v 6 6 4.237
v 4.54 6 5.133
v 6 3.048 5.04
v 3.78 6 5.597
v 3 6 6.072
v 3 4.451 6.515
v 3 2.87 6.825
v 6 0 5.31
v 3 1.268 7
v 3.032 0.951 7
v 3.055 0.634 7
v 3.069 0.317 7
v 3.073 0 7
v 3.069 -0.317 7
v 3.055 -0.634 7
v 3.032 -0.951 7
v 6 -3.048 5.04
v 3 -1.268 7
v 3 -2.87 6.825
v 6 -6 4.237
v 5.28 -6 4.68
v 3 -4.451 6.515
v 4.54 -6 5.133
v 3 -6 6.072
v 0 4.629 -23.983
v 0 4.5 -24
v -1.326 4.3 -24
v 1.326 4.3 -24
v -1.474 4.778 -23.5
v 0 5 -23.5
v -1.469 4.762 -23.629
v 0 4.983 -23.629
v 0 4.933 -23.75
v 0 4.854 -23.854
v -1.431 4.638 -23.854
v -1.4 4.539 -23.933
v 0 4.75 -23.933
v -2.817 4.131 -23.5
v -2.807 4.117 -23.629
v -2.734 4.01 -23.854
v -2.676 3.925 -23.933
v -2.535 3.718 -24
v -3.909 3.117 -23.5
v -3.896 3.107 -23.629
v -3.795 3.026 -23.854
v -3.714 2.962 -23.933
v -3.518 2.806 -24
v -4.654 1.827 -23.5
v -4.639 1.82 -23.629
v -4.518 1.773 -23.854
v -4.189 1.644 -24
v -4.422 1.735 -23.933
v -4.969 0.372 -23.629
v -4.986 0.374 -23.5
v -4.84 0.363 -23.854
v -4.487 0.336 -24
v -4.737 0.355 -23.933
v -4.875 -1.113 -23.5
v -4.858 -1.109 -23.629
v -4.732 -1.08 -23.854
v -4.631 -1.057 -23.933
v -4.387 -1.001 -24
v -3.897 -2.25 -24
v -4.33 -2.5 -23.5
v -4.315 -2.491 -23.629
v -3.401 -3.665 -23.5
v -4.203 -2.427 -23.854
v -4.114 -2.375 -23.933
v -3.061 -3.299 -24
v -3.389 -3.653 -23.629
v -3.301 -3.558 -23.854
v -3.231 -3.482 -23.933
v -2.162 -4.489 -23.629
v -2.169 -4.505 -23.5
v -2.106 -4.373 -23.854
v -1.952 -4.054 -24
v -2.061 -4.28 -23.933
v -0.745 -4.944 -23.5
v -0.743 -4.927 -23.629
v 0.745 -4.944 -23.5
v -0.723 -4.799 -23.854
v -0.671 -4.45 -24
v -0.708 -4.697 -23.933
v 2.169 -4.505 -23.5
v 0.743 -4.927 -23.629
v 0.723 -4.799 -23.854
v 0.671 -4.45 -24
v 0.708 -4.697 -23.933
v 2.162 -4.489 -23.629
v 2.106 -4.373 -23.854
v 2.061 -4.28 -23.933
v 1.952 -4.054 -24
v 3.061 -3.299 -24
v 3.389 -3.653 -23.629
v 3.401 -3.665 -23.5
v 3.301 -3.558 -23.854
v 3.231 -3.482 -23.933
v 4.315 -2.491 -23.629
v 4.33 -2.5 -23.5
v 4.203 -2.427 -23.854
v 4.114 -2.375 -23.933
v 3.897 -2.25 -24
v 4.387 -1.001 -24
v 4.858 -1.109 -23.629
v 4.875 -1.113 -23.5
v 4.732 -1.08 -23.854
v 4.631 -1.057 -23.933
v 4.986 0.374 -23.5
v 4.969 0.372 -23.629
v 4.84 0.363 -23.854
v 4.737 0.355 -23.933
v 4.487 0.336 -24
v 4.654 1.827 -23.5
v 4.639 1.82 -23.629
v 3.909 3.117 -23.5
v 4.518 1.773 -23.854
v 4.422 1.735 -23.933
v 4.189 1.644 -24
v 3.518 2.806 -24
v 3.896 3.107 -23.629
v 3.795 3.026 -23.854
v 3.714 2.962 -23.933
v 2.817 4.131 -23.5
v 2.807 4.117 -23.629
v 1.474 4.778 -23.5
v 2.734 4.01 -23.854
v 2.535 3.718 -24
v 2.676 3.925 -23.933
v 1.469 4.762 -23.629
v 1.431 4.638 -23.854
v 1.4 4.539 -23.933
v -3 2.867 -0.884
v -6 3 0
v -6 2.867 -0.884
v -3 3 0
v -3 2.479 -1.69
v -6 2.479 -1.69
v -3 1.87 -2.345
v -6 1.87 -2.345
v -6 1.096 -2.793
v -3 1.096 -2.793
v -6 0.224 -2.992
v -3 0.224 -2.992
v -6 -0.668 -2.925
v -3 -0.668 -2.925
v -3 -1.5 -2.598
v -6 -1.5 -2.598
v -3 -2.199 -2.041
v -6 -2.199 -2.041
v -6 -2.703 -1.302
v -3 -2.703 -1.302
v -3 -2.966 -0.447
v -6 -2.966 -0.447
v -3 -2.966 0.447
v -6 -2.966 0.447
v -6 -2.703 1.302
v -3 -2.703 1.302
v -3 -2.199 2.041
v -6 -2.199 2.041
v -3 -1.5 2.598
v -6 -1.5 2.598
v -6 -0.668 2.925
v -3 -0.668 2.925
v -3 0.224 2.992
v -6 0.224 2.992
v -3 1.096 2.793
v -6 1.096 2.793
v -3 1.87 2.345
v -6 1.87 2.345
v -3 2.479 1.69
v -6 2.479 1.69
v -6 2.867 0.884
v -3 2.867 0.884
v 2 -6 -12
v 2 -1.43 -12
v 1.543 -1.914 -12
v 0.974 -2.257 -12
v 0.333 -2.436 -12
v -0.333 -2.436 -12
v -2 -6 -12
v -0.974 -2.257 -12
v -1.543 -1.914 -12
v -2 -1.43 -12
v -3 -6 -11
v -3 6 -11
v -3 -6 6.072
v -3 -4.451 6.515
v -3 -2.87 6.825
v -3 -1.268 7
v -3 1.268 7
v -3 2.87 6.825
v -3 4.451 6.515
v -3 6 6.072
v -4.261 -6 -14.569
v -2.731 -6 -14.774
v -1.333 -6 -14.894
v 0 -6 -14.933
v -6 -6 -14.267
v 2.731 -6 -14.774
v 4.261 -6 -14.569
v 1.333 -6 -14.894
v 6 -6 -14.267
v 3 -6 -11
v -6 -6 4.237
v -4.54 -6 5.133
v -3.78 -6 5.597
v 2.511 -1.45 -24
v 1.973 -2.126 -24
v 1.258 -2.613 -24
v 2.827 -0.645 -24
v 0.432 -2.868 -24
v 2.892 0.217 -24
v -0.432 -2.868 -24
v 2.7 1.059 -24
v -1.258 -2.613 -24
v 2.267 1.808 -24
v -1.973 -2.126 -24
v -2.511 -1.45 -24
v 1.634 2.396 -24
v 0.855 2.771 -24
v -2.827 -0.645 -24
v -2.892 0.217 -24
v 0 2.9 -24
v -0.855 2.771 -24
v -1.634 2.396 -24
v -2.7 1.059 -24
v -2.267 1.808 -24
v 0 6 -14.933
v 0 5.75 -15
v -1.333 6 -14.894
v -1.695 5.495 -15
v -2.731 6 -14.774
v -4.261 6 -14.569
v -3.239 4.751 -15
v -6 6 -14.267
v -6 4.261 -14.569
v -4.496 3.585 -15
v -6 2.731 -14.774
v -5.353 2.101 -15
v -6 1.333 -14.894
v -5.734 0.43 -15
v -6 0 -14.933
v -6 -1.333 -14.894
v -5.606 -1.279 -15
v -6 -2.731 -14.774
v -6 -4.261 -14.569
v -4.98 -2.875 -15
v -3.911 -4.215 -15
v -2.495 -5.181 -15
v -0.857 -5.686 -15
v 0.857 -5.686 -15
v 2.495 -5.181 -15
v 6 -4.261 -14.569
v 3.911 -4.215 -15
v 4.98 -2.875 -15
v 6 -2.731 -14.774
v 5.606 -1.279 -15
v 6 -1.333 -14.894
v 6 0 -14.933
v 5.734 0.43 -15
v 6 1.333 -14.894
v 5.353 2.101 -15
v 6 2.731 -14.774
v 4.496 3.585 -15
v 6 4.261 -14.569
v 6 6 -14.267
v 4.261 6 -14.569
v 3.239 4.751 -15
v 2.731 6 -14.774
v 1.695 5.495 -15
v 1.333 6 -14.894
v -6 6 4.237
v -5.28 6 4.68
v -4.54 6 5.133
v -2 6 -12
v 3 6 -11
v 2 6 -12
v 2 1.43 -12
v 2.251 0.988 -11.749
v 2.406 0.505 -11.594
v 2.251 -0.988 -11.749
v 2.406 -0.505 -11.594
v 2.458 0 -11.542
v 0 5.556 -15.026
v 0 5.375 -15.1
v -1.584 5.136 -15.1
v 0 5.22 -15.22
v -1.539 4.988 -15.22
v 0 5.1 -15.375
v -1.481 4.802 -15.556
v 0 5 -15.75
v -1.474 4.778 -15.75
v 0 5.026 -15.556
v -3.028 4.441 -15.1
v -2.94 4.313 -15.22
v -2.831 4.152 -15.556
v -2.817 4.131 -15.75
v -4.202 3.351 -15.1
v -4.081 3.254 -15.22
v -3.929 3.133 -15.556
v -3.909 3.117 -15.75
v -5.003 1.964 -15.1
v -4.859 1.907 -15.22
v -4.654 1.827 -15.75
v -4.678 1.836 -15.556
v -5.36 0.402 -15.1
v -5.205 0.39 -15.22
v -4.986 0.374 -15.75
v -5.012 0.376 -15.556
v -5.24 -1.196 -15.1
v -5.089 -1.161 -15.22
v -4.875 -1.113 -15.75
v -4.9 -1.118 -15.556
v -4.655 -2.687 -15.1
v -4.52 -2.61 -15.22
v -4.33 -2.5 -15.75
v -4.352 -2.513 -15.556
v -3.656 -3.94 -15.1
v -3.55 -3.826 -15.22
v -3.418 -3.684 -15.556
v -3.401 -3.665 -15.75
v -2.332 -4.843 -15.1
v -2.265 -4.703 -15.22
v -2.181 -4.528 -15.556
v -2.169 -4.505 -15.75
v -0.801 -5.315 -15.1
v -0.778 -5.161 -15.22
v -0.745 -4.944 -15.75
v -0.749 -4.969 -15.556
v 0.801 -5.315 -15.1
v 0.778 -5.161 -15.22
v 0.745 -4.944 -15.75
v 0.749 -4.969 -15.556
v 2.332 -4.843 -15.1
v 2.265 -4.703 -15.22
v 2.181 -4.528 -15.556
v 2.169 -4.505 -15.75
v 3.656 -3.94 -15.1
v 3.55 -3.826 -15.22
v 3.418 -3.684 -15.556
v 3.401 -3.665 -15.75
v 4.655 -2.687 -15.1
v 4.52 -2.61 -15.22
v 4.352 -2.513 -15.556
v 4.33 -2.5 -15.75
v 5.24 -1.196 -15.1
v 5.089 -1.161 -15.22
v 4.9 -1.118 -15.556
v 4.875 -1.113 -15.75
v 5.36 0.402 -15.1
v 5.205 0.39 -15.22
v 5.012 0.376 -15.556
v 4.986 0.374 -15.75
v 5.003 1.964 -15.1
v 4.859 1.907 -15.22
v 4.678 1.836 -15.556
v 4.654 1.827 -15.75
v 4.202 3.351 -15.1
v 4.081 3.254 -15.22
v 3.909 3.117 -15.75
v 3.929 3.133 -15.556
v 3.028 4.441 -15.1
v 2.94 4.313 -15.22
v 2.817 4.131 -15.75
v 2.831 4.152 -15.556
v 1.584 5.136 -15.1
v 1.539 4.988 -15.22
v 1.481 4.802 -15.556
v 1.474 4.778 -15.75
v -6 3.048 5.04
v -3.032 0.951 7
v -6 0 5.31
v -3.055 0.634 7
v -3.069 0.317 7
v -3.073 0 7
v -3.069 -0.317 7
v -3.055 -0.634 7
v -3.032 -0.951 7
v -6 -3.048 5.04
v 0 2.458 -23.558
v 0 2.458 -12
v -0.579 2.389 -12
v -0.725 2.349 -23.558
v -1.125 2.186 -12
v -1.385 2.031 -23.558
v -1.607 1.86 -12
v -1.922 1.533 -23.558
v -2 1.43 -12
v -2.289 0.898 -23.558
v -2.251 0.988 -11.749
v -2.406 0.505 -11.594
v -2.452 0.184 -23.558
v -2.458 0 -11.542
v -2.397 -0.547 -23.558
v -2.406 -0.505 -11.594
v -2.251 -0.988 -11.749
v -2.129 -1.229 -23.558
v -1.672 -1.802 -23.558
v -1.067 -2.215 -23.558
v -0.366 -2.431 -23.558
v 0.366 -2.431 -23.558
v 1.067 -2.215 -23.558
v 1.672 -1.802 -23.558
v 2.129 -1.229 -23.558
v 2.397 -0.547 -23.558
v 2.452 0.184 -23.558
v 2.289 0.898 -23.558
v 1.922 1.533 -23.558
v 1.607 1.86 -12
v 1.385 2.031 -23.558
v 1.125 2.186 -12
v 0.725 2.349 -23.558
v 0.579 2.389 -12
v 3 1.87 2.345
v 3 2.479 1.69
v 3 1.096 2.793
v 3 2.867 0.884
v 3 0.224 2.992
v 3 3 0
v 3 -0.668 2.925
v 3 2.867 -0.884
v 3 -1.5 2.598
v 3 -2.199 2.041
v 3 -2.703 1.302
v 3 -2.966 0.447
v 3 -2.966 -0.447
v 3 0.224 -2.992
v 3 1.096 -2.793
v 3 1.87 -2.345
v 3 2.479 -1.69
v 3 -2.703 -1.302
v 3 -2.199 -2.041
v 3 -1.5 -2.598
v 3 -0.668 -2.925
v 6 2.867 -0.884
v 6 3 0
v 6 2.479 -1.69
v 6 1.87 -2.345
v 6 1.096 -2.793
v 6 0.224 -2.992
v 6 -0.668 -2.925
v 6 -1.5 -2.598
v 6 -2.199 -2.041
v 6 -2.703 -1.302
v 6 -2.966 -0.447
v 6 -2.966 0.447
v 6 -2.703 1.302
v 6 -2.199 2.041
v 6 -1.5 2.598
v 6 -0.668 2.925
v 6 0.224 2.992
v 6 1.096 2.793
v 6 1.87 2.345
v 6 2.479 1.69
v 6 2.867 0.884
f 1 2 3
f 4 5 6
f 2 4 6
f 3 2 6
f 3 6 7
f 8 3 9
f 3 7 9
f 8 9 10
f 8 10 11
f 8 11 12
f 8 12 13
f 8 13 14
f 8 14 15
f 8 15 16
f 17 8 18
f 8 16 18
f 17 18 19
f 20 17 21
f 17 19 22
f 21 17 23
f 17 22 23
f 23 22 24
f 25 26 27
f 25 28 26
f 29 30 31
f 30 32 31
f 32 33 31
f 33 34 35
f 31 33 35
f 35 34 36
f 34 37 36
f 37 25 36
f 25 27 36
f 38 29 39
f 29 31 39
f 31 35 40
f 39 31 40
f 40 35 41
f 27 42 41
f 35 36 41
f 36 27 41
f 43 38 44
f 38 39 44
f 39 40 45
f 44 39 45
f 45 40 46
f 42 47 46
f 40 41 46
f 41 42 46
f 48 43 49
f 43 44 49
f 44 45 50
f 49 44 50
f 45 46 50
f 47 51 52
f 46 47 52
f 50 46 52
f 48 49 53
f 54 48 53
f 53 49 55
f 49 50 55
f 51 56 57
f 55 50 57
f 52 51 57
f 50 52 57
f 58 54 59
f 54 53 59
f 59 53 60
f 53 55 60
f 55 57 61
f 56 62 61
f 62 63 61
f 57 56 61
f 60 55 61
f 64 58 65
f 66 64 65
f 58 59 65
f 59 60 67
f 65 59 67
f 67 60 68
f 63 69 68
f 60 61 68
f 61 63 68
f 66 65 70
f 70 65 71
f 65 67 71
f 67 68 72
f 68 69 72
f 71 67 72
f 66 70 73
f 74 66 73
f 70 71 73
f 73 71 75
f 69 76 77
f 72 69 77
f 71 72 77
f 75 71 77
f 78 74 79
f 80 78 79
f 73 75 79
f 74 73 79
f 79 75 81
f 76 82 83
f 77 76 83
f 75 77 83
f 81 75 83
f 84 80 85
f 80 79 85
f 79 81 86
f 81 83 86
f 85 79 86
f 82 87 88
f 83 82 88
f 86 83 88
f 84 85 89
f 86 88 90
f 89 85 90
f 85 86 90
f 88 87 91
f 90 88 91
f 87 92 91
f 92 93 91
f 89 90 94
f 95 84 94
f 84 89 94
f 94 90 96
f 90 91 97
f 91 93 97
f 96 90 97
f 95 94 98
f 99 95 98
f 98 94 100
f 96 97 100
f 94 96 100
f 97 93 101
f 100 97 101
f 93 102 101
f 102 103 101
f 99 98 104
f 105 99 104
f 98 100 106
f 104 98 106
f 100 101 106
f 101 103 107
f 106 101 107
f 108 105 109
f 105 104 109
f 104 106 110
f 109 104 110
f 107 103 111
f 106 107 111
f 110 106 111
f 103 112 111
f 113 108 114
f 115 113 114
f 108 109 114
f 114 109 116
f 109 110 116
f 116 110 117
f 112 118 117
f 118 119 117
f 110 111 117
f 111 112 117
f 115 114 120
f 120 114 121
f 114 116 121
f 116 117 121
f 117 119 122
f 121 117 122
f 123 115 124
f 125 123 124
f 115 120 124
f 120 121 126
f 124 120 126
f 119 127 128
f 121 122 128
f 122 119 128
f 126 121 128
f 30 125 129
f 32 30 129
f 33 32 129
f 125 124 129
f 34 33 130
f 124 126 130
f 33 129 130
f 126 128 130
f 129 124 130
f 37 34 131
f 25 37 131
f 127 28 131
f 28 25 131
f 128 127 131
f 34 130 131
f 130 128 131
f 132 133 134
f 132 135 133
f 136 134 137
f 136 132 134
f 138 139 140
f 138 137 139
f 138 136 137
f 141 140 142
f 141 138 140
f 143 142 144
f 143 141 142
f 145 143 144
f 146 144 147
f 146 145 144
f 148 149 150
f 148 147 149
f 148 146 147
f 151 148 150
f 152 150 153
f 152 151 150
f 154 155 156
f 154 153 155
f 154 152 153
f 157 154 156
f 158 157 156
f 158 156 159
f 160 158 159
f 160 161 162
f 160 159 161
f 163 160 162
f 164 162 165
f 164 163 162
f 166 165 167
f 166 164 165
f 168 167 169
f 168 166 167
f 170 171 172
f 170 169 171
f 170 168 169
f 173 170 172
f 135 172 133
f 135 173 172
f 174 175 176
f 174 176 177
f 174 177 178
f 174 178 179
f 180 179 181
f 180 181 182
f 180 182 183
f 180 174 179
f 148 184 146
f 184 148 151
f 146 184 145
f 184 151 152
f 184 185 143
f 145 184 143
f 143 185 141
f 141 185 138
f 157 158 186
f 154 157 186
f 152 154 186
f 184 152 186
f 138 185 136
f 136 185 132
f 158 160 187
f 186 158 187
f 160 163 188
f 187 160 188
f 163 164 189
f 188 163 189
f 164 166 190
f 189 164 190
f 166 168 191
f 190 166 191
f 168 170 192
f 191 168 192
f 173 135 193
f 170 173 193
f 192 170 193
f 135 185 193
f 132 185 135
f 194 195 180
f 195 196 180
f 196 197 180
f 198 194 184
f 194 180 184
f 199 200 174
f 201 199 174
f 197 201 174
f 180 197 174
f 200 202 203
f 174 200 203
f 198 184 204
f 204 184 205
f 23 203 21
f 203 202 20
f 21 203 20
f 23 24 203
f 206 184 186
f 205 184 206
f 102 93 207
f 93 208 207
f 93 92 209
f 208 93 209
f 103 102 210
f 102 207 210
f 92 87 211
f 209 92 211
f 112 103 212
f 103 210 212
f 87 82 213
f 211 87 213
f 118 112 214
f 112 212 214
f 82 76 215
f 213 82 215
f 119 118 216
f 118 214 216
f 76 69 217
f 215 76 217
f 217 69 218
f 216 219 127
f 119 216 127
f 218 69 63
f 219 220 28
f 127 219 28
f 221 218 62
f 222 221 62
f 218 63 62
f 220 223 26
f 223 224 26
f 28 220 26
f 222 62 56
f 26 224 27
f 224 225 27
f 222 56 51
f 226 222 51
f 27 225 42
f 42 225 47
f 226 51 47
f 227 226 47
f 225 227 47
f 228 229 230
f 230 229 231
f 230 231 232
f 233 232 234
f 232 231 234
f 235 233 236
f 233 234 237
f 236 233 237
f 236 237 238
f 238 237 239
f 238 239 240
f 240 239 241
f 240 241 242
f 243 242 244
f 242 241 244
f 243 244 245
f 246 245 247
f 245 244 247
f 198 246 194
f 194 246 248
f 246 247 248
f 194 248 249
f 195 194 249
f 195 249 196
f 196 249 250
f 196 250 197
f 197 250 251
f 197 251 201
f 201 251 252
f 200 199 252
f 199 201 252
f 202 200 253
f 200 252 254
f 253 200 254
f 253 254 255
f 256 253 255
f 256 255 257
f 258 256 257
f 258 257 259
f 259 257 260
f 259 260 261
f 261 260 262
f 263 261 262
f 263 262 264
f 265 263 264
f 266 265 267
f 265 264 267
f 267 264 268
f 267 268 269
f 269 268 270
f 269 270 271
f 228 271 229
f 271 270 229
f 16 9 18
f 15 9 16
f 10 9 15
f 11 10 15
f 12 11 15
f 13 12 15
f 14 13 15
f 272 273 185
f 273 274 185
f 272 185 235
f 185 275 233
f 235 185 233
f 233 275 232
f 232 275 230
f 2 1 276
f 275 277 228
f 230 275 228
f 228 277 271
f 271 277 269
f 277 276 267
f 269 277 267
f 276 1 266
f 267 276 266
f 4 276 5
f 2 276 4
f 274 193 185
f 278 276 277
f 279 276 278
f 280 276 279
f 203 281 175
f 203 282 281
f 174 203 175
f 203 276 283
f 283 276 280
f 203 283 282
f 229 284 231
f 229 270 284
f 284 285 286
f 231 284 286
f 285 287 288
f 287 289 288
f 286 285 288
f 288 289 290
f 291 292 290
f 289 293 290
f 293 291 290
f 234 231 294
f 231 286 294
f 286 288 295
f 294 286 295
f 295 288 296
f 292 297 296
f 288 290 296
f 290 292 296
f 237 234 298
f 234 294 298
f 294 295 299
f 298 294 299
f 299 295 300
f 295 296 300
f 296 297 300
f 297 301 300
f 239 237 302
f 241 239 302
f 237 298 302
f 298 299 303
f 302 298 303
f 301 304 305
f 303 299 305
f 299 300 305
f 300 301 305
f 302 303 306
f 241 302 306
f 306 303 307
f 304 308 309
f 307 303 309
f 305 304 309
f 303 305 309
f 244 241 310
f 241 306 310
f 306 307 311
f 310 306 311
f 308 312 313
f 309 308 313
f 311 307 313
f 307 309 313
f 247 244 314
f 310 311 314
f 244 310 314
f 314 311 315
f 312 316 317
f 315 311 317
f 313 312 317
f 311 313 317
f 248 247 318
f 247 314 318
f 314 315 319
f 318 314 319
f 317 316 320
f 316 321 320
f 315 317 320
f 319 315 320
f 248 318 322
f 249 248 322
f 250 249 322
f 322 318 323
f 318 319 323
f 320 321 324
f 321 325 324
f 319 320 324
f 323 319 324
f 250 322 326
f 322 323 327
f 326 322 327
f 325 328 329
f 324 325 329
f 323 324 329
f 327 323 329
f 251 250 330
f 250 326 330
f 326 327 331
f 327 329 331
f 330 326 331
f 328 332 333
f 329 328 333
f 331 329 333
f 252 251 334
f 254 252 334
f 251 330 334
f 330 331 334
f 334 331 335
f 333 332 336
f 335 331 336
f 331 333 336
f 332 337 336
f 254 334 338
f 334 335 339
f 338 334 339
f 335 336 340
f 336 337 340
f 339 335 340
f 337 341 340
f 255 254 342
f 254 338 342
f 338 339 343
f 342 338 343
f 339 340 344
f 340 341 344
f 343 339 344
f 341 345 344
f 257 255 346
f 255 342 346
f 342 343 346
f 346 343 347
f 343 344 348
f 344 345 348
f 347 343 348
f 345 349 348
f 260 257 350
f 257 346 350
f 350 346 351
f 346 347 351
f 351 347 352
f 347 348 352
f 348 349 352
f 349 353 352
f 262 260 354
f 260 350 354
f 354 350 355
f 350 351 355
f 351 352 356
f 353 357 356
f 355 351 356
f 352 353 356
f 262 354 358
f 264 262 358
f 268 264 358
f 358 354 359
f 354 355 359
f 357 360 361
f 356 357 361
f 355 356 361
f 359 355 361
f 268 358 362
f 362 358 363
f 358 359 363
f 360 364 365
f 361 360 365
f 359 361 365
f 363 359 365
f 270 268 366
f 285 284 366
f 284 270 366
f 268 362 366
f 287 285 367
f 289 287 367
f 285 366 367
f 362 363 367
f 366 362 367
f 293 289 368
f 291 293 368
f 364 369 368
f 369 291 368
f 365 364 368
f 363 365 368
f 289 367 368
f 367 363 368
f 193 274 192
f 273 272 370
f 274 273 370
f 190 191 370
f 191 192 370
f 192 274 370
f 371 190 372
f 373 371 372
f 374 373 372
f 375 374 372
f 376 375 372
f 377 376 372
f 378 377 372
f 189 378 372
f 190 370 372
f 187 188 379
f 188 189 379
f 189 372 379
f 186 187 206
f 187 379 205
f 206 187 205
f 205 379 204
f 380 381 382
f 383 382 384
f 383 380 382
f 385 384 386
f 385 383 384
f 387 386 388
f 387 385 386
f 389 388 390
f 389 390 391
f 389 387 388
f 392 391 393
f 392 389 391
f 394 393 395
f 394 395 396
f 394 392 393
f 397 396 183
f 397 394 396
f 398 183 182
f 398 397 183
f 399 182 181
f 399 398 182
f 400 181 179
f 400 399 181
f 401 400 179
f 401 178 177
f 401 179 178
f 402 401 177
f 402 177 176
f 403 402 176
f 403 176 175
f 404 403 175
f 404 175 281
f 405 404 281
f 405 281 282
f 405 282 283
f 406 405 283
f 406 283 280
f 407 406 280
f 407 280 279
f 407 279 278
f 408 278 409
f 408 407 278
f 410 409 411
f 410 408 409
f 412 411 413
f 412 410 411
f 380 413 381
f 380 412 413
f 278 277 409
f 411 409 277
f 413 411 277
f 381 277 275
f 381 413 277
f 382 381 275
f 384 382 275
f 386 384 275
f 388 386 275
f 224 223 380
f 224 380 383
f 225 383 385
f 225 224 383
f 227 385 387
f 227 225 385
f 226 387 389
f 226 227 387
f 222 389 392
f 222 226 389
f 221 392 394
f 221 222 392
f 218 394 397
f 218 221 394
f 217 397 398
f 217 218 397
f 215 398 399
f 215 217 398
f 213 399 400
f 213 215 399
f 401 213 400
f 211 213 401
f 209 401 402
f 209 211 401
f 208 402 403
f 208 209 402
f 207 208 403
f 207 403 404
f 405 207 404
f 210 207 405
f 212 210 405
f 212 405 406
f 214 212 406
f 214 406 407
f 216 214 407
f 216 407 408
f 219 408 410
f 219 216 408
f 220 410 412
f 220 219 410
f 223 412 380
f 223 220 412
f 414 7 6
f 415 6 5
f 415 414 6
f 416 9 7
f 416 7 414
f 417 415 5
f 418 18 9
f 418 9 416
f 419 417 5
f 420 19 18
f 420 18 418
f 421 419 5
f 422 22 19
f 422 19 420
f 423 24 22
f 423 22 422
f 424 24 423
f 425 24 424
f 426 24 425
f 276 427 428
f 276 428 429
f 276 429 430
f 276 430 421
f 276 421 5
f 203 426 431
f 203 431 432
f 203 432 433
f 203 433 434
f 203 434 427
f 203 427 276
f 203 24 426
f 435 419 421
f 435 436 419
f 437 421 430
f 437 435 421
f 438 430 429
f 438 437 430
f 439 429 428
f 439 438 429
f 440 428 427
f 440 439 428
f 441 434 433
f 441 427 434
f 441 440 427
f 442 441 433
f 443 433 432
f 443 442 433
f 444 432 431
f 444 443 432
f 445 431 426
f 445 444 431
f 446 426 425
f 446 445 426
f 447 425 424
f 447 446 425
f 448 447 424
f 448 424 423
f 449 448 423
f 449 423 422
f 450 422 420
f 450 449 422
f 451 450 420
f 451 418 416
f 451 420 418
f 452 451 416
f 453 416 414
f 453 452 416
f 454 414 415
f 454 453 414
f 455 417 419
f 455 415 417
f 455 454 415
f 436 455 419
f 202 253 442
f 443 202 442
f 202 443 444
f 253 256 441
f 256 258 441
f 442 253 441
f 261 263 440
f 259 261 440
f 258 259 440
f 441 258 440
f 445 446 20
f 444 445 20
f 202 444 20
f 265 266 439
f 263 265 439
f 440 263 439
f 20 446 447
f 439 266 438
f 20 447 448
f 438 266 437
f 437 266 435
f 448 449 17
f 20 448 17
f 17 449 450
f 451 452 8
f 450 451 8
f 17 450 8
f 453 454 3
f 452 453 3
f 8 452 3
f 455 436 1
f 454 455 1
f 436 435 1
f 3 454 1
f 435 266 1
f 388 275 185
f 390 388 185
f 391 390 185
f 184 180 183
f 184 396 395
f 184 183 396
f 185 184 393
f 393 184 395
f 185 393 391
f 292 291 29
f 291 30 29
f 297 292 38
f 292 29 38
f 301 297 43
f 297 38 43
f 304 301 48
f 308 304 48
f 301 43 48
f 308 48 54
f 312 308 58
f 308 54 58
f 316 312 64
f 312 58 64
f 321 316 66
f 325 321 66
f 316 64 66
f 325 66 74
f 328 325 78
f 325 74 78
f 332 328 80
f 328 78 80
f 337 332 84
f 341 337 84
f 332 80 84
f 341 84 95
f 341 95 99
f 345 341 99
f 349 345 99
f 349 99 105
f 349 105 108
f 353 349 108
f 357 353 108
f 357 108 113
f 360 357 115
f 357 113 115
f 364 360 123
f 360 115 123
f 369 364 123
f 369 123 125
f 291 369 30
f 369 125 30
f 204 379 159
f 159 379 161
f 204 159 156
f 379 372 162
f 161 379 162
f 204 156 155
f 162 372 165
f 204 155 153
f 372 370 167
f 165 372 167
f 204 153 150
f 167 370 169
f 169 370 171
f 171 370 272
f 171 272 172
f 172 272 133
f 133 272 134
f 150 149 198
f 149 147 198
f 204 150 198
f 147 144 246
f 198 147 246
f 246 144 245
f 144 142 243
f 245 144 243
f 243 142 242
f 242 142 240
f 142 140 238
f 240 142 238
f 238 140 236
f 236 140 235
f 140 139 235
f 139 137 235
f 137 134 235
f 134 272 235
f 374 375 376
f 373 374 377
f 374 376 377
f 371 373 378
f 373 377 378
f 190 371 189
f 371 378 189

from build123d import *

# Parameters (mm, degrees)
CUT_EXTRUDE1_DEPTH           = 13
CUT_EXTRUDE1_DEPTH_BACK      = 13
CUT_EXTRUDE2_DEPTH           = 13
CUT_EXTRUDE2_DEPTH_BACK      = 13
CUT_EXTRUDE3_DEPTH           = 13
CUT_EXTRUDE3_DEPTH_BACK      = 13
SKETCH5_W                    = 16.2
SKETCH5_H                    = 3
CUT_REVOLVE3_ANGLE           = 90
CUT_REVOLVE3_OTHER_WAY_ANGLE = 90


with BuildPart() as part:
    # Sketch1 → Revolve1 (revolve)
    with BuildSketch(Plane(origin=(0, 0, 0), x_dir=(0, 0, -1), z_dir=(1, 0, 0))):
        with BuildLine():
            Line((-7, 0), (-7, 12))
            Line((-7, 12), (13.325317547, 12))
            Line((13.325317547, 12), (15, 5.75))
            ThreePointArc((15, 5.75), (15.219669914, 5.219669914), (15.75, 5))
            Line((15.75, 5), (23.5, 5))
            ThreePointArc((23.5, 5), (23.853553391, 4.853553391), (24, 4.5))
            Line((24, 4.5), (24, 0))
            Line((24, 0), (-7, 0))
        make_face()
    revolve(axis=Axis((0, 0, -24), (0, 0, 1)))

    # Sketch2 → Cut-Extrude1 (cut, two sides: drawn at the far end of the back side and taken through both)
    with BuildSketch(Plane(origin=(0, 0, 0), x_dir=(1, 0, 0), z_dir=(0, 1, 0)).offset(-CUT_EXTRUDE1_DEPTH_BACK)):
        Polygon((-3, 11), (-3, -8), (3, -8), (3, 11), (2, 12), (-2, 12), align=None)
    extrude(amount=CUT_EXTRUDE1_DEPTH + CUT_EXTRUDE1_DEPTH_BACK, mode=Mode.SUBTRACT)

    # Sketch3 → Cut-Extrude2 (cut, two sides: drawn at the far end of the back side and taken through both)
    with BuildSketch(Plane(origin=(0, 0, 0), x_dir=(0, 0, -1), z_dir=(1, 0, 0)).offset(-CUT_EXTRUDE2_DEPTH_BACK)):
        Polygon((-20, -18), (24, -18), (24, -6), (-8, -6), (-8, 6), (24, 6), (24, 18), (-20, 18), align=None)
    extrude(amount=CUT_EXTRUDE2_DEPTH + CUT_EXTRUDE2_DEPTH_BACK, mode=Mode.SUBTRACT)

    # Sketch4 → Cut-Extrude3 (cut, two sides: drawn at the far end of the back side and taken through both)
    with BuildSketch(Plane(origin=(0, 0, 0), x_dir=(1, 0, 0), z_dir=(0, 1, 0)).offset(-CUT_EXTRUDE3_DEPTH_BACK)):
        Polygon((-18, -20), (18, -20), (18, 24), (6, 24), (6, -8), (-6, -8), (-6, 24), (-18, 24), align=None)
    extrude(amount=CUT_EXTRUDE3_DEPTH + CUT_EXTRUDE3_DEPTH_BACK, mode=Mode.SUBTRACT)

    # Sketch5 → Cut-Revolve1 (revolve, cut)
    with BuildSketch(Plane.XY):
        with Locations((0, 1.5)):
            Rectangle(SKETCH5_W, SKETCH5_H)
    revolve(axis=Axis((8.1, 0, 0), (-1, 0, 0)), mode=Mode.SUBTRACT)

    # Sketch6 → Cut-Revolve2 (revolve, cut)
    with BuildSketch(Plane(origin=(0, 0, 0), x_dir=(0, 0, -1), z_dir=(1, 0, 0))):
        Polygon((10.9, 0), (10.9, 2.4585), (23.5585, 2.4585), (24.1, 3), (24.1, 0), align=None)
    revolve(axis=Axis((0, 0, -24.1), (0, 0, 1)), mode=Mode.SUBTRACT)

    # Sketch7 → Cut-Revolve3 (revolve, cut)
    with BuildSketch(Plane(origin=(0, 0, 0), x_dir=(1, 0, 0), z_dir=(0, 1, 0))):
        Polygon((-7, -18.589270357), (0, -22.630722241), (7, -18.589270357), (7, -4.732863896), (0, -8.774315781), (-7, -4.732863896), align=None)
    revolve(axis=Axis((-7, 0, -12), (-1, 0, 0)), revolution_arc=CUT_REVOLVE3_ANGLE, mode=Mode.SUBTRACT)

    # Sketch7 → Cut-Revolve3 other way (revolve, cut)
    with BuildSketch(Plane(origin=(0, 0, 0), x_dir=(1, 0, 0), z_dir=(0, 1, 0))):
        Polygon((-7, -18.589270357), (0, -22.630722241), (7, -18.589270357), (7, -4.732863896), (0, -8.774315781), (-7, -4.732863896), align=None)
    revolve(axis=Axis((-7, 0, -12), (1, 0, 0)), revolution_arc=CUT_REVOLVE3_OTHER_WAY_ANGLE, mode=Mode.SUBTRACT)


solid = part.part
